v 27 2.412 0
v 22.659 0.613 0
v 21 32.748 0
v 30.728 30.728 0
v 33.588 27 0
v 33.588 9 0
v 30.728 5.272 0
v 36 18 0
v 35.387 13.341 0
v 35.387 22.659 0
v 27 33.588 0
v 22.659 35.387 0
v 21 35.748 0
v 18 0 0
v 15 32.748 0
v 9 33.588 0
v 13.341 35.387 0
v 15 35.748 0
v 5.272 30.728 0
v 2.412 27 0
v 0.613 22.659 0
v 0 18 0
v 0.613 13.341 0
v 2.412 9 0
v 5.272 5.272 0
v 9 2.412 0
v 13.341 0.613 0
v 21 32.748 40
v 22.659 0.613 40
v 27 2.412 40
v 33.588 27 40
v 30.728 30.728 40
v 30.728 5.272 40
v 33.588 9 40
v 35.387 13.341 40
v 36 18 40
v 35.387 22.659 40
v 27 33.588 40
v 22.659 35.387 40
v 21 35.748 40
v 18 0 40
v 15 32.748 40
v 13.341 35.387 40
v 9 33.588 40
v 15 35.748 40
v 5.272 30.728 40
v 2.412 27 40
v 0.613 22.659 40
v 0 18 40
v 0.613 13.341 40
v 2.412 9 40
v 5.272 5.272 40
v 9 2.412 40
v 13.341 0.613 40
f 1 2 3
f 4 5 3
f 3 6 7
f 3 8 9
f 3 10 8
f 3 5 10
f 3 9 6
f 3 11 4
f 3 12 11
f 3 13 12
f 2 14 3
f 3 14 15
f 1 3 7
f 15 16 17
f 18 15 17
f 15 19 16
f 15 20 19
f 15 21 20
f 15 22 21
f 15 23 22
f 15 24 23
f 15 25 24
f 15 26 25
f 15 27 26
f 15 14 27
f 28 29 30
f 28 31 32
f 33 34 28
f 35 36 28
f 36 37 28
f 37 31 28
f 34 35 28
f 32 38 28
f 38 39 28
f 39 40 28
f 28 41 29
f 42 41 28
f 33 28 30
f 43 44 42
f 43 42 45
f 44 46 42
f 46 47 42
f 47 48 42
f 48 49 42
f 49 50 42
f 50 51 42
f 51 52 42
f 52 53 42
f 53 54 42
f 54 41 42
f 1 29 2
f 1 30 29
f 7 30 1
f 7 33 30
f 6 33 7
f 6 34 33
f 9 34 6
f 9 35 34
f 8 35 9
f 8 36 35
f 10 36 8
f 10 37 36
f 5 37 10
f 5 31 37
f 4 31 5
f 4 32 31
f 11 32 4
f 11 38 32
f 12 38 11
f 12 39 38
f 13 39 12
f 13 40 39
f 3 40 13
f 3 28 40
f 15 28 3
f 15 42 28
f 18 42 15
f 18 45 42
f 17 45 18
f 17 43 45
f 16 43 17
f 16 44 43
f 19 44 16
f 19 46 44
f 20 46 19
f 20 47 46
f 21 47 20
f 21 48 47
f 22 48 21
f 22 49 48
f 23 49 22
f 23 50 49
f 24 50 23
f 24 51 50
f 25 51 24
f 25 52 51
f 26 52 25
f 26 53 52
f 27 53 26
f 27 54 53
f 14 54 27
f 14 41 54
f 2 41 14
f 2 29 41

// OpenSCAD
$fn = 32;

// ----------------------------------------------------------------------
// Keyway shaft: d36 shaft, key 6 x 3 mm
// ----------------------------------------------------------------------

// --- parameters (mm) ---
shaft_r = 18;             // shaft radius
key_w = 6;                // keyway width
key_d = 3;                // keyway depth below the surface line
plate_t = 40;             // shaft length, Z (extrusion height)

shaft_d = 2 * shaft_r;  // shaft diameter
circle_step = 15;  // polygon sampling step, degrees

profile = [[13.341, 35.387], [9, 33.588], [5.272, 30.728], [2.412, 27], [0.613, 22.659], [0, 18], [0.613, 13.341], [2.412, 9], [5.272, 5.272], [9, 2.412], [13.341, 0.613], [18, 0], [22.659, 0.613], [27, 2.412], [30.728, 5.272], [33.588, 9], [35.387, 13.341], [36, 18], [35.387, 22.659], [33.588, 27], [30.728, 30.728], [27, 33.588], [22.659, 35.387], [21, 35.748], [21, 32.748], [15, 32.748], [15, 35.748]];  // primary outline, 27 points, counter clockwise

// --- the one profile operation ---
linear_extrude(height = plate_t) polygon(points = profile);
